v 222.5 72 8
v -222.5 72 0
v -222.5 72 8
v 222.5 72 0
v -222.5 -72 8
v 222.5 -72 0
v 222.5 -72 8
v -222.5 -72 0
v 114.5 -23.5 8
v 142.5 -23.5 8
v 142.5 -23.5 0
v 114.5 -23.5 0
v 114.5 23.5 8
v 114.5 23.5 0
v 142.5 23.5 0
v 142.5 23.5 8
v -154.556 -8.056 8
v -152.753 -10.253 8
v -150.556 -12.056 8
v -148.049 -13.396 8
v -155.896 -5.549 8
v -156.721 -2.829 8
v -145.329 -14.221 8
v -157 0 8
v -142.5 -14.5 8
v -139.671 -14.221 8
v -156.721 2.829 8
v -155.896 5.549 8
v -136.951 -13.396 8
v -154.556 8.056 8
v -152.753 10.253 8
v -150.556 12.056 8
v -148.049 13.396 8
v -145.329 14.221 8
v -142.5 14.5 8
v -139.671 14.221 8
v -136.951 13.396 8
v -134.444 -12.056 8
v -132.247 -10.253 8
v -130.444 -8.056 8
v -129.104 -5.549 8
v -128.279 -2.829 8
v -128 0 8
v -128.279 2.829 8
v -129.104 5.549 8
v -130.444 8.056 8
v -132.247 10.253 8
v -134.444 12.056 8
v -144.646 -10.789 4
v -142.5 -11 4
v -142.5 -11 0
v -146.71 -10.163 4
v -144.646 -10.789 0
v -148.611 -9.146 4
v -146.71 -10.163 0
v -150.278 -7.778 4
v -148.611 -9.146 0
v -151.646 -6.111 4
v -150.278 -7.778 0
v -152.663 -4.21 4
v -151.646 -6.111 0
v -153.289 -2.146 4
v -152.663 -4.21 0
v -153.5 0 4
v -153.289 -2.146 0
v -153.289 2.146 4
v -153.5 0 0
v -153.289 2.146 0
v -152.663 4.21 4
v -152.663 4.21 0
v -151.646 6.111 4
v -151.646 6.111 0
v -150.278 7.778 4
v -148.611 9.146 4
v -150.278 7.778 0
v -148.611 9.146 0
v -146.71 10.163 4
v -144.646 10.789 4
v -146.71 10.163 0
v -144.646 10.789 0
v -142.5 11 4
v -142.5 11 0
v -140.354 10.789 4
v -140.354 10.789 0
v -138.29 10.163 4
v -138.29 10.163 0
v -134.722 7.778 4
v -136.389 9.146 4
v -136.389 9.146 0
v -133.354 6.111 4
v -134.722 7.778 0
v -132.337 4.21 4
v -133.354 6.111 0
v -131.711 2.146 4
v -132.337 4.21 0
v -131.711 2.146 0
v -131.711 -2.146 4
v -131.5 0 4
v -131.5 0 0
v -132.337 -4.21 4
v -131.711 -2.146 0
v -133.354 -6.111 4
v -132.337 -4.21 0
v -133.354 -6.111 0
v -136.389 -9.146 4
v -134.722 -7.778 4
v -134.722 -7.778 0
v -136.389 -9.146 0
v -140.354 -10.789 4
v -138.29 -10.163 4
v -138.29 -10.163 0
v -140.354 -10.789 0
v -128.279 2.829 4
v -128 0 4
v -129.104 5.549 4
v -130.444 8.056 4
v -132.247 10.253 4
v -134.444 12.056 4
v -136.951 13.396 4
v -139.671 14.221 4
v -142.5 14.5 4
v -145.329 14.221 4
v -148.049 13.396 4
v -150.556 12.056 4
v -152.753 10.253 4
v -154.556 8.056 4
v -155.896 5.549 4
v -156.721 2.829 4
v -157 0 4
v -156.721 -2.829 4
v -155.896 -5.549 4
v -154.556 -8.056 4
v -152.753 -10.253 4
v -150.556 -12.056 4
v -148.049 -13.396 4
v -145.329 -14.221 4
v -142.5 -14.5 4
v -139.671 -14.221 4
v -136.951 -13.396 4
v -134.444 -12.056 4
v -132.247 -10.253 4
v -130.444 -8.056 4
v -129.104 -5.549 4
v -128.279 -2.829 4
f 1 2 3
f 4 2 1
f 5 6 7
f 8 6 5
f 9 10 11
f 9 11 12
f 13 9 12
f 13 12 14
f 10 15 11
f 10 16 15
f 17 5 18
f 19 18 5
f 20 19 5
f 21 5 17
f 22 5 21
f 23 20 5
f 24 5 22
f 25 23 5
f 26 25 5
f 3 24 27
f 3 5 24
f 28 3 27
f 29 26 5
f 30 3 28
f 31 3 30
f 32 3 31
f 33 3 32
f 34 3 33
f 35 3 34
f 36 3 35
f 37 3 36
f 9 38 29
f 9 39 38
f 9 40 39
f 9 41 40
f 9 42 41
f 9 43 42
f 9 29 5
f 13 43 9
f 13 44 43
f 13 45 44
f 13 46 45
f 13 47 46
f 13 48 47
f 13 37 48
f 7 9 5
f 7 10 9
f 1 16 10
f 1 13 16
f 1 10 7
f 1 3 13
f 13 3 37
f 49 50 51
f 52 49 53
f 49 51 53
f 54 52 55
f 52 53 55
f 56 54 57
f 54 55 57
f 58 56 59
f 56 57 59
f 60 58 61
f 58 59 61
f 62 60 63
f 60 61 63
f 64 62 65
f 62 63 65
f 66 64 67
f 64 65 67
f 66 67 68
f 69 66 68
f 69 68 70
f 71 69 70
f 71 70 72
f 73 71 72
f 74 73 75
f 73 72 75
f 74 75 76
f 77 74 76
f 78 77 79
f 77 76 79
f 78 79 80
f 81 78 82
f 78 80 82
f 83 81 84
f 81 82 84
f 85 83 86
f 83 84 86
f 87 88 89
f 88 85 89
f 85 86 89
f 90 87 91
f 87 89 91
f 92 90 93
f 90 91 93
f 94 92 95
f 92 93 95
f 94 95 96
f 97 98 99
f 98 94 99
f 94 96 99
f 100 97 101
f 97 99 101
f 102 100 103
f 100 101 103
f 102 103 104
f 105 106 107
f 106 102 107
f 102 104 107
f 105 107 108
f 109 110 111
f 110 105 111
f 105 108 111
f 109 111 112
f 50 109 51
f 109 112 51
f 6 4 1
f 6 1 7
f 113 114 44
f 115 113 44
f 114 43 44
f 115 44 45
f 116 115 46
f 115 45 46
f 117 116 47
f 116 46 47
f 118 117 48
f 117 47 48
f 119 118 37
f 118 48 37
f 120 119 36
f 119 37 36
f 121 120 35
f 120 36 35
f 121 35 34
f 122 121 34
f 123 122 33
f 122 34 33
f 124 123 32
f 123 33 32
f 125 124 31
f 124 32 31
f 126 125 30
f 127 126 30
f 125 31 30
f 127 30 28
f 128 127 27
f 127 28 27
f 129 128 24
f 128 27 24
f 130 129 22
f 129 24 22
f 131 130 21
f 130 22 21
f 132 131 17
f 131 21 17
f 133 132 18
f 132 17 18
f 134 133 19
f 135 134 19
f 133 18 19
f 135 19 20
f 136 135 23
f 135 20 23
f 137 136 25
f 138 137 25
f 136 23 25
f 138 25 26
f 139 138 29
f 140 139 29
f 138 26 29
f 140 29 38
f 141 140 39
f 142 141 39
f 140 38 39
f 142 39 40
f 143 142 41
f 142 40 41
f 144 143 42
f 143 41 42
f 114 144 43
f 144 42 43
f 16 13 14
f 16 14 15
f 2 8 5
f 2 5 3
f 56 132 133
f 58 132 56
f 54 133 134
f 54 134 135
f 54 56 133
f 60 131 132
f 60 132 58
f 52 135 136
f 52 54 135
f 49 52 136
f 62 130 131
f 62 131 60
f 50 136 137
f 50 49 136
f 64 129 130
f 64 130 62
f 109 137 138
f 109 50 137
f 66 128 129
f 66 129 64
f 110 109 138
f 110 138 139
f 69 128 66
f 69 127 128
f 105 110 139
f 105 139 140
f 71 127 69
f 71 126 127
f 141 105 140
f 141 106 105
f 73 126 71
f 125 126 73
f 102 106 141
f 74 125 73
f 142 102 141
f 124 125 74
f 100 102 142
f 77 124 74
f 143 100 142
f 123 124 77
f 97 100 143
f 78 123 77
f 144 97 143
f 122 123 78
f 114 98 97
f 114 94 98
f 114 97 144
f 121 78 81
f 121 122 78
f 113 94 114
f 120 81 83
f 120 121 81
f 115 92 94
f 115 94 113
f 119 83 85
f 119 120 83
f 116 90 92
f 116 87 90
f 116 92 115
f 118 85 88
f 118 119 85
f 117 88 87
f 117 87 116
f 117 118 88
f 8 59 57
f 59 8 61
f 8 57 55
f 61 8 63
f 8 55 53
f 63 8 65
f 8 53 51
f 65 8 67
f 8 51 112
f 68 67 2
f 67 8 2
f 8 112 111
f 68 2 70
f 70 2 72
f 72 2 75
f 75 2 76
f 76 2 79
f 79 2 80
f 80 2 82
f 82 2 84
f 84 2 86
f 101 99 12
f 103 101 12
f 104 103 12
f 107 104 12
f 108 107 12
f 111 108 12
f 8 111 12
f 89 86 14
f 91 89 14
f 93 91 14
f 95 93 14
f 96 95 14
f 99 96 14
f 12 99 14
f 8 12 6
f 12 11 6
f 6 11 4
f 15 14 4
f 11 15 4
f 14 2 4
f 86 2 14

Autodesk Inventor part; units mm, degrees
ref_plane "YZ Plane" through (0, 0, 0) normal (1, 0, 0) x (0, 1, 0)
ref_plane "XZ Plane" through (0, 0, 0) normal (0, 1, 0) x (-1, 0, 0)
ref_plane "XY Plane" through (0, 0, 0) normal (0, 0, 1) x (1, 0, 0)
sketch "Sketch1" plane through (0, 0, 0) normal (0, 0, 1) x (1, 0, 0)
  line L0 (-222.5, 72) -> (222.5, 72)
  line L1 (222.5, 72) -> (222.5, -72)
  line L2 (222.5, -72) -> (-222.5, -72)
  line L3 (-222.5, -72) -> (-222.5, 72)
  point P0 (0, 0)
  dimension "d0" = 445
  dimension "d1" = 144
  dimension "d2" = 72
  dimension "d3" = 222.5
extrude "Extrusion1" add sketch "Sketch1" along normal blind 8
hole "Hole1" at (-142.5, 0, 8) direction (0, 0, -1) diameter 22 end through all
sketch "Sketch2" plane through (0, 0, 8) normal (0, 0, 1) x (1, 0, 0)
  circle A0 centre (-142.5, 0) radius 11 projected
  circle A1 centre (-142.5, 0) radius 14.5
  point P0 (0, 0)
  dimension "d15" = 29
extrude "Extrusion2" cut sketch "Sketch2" against normal blind 4
sketch "Sketch3" plane through (0, 0, 8) normal (0, 0, 1) x (1, 0, 0)
  line L0 (114.5, 23.5) -> (142.5, 23.5)
  line L1 (142.5, 23.5) -> (142.5, -23.5)
  line L2 (142.5, -23.5) -> (114.5, -23.5)
  line L3 (114.5, -23.5) -> (114.5, 23.5)
  line L4 (222.5, -72) -> (222.5, 72) projected
  point P0 (0, 0)
  dimension "d18" = 28
  dimension "d19" = 47
  dimension "d20" = 80
  dimension "d21" = 23.5
extrude "Extrusion3" cut sketch "Sketch3" against normal through all
equation "\"d2\" = 0.5 * d1"
equation "\"d3\" = 0.5 * d0"
equation "\"d21\" = 0.5 * d19"
properties part number "placa verticala priza"
